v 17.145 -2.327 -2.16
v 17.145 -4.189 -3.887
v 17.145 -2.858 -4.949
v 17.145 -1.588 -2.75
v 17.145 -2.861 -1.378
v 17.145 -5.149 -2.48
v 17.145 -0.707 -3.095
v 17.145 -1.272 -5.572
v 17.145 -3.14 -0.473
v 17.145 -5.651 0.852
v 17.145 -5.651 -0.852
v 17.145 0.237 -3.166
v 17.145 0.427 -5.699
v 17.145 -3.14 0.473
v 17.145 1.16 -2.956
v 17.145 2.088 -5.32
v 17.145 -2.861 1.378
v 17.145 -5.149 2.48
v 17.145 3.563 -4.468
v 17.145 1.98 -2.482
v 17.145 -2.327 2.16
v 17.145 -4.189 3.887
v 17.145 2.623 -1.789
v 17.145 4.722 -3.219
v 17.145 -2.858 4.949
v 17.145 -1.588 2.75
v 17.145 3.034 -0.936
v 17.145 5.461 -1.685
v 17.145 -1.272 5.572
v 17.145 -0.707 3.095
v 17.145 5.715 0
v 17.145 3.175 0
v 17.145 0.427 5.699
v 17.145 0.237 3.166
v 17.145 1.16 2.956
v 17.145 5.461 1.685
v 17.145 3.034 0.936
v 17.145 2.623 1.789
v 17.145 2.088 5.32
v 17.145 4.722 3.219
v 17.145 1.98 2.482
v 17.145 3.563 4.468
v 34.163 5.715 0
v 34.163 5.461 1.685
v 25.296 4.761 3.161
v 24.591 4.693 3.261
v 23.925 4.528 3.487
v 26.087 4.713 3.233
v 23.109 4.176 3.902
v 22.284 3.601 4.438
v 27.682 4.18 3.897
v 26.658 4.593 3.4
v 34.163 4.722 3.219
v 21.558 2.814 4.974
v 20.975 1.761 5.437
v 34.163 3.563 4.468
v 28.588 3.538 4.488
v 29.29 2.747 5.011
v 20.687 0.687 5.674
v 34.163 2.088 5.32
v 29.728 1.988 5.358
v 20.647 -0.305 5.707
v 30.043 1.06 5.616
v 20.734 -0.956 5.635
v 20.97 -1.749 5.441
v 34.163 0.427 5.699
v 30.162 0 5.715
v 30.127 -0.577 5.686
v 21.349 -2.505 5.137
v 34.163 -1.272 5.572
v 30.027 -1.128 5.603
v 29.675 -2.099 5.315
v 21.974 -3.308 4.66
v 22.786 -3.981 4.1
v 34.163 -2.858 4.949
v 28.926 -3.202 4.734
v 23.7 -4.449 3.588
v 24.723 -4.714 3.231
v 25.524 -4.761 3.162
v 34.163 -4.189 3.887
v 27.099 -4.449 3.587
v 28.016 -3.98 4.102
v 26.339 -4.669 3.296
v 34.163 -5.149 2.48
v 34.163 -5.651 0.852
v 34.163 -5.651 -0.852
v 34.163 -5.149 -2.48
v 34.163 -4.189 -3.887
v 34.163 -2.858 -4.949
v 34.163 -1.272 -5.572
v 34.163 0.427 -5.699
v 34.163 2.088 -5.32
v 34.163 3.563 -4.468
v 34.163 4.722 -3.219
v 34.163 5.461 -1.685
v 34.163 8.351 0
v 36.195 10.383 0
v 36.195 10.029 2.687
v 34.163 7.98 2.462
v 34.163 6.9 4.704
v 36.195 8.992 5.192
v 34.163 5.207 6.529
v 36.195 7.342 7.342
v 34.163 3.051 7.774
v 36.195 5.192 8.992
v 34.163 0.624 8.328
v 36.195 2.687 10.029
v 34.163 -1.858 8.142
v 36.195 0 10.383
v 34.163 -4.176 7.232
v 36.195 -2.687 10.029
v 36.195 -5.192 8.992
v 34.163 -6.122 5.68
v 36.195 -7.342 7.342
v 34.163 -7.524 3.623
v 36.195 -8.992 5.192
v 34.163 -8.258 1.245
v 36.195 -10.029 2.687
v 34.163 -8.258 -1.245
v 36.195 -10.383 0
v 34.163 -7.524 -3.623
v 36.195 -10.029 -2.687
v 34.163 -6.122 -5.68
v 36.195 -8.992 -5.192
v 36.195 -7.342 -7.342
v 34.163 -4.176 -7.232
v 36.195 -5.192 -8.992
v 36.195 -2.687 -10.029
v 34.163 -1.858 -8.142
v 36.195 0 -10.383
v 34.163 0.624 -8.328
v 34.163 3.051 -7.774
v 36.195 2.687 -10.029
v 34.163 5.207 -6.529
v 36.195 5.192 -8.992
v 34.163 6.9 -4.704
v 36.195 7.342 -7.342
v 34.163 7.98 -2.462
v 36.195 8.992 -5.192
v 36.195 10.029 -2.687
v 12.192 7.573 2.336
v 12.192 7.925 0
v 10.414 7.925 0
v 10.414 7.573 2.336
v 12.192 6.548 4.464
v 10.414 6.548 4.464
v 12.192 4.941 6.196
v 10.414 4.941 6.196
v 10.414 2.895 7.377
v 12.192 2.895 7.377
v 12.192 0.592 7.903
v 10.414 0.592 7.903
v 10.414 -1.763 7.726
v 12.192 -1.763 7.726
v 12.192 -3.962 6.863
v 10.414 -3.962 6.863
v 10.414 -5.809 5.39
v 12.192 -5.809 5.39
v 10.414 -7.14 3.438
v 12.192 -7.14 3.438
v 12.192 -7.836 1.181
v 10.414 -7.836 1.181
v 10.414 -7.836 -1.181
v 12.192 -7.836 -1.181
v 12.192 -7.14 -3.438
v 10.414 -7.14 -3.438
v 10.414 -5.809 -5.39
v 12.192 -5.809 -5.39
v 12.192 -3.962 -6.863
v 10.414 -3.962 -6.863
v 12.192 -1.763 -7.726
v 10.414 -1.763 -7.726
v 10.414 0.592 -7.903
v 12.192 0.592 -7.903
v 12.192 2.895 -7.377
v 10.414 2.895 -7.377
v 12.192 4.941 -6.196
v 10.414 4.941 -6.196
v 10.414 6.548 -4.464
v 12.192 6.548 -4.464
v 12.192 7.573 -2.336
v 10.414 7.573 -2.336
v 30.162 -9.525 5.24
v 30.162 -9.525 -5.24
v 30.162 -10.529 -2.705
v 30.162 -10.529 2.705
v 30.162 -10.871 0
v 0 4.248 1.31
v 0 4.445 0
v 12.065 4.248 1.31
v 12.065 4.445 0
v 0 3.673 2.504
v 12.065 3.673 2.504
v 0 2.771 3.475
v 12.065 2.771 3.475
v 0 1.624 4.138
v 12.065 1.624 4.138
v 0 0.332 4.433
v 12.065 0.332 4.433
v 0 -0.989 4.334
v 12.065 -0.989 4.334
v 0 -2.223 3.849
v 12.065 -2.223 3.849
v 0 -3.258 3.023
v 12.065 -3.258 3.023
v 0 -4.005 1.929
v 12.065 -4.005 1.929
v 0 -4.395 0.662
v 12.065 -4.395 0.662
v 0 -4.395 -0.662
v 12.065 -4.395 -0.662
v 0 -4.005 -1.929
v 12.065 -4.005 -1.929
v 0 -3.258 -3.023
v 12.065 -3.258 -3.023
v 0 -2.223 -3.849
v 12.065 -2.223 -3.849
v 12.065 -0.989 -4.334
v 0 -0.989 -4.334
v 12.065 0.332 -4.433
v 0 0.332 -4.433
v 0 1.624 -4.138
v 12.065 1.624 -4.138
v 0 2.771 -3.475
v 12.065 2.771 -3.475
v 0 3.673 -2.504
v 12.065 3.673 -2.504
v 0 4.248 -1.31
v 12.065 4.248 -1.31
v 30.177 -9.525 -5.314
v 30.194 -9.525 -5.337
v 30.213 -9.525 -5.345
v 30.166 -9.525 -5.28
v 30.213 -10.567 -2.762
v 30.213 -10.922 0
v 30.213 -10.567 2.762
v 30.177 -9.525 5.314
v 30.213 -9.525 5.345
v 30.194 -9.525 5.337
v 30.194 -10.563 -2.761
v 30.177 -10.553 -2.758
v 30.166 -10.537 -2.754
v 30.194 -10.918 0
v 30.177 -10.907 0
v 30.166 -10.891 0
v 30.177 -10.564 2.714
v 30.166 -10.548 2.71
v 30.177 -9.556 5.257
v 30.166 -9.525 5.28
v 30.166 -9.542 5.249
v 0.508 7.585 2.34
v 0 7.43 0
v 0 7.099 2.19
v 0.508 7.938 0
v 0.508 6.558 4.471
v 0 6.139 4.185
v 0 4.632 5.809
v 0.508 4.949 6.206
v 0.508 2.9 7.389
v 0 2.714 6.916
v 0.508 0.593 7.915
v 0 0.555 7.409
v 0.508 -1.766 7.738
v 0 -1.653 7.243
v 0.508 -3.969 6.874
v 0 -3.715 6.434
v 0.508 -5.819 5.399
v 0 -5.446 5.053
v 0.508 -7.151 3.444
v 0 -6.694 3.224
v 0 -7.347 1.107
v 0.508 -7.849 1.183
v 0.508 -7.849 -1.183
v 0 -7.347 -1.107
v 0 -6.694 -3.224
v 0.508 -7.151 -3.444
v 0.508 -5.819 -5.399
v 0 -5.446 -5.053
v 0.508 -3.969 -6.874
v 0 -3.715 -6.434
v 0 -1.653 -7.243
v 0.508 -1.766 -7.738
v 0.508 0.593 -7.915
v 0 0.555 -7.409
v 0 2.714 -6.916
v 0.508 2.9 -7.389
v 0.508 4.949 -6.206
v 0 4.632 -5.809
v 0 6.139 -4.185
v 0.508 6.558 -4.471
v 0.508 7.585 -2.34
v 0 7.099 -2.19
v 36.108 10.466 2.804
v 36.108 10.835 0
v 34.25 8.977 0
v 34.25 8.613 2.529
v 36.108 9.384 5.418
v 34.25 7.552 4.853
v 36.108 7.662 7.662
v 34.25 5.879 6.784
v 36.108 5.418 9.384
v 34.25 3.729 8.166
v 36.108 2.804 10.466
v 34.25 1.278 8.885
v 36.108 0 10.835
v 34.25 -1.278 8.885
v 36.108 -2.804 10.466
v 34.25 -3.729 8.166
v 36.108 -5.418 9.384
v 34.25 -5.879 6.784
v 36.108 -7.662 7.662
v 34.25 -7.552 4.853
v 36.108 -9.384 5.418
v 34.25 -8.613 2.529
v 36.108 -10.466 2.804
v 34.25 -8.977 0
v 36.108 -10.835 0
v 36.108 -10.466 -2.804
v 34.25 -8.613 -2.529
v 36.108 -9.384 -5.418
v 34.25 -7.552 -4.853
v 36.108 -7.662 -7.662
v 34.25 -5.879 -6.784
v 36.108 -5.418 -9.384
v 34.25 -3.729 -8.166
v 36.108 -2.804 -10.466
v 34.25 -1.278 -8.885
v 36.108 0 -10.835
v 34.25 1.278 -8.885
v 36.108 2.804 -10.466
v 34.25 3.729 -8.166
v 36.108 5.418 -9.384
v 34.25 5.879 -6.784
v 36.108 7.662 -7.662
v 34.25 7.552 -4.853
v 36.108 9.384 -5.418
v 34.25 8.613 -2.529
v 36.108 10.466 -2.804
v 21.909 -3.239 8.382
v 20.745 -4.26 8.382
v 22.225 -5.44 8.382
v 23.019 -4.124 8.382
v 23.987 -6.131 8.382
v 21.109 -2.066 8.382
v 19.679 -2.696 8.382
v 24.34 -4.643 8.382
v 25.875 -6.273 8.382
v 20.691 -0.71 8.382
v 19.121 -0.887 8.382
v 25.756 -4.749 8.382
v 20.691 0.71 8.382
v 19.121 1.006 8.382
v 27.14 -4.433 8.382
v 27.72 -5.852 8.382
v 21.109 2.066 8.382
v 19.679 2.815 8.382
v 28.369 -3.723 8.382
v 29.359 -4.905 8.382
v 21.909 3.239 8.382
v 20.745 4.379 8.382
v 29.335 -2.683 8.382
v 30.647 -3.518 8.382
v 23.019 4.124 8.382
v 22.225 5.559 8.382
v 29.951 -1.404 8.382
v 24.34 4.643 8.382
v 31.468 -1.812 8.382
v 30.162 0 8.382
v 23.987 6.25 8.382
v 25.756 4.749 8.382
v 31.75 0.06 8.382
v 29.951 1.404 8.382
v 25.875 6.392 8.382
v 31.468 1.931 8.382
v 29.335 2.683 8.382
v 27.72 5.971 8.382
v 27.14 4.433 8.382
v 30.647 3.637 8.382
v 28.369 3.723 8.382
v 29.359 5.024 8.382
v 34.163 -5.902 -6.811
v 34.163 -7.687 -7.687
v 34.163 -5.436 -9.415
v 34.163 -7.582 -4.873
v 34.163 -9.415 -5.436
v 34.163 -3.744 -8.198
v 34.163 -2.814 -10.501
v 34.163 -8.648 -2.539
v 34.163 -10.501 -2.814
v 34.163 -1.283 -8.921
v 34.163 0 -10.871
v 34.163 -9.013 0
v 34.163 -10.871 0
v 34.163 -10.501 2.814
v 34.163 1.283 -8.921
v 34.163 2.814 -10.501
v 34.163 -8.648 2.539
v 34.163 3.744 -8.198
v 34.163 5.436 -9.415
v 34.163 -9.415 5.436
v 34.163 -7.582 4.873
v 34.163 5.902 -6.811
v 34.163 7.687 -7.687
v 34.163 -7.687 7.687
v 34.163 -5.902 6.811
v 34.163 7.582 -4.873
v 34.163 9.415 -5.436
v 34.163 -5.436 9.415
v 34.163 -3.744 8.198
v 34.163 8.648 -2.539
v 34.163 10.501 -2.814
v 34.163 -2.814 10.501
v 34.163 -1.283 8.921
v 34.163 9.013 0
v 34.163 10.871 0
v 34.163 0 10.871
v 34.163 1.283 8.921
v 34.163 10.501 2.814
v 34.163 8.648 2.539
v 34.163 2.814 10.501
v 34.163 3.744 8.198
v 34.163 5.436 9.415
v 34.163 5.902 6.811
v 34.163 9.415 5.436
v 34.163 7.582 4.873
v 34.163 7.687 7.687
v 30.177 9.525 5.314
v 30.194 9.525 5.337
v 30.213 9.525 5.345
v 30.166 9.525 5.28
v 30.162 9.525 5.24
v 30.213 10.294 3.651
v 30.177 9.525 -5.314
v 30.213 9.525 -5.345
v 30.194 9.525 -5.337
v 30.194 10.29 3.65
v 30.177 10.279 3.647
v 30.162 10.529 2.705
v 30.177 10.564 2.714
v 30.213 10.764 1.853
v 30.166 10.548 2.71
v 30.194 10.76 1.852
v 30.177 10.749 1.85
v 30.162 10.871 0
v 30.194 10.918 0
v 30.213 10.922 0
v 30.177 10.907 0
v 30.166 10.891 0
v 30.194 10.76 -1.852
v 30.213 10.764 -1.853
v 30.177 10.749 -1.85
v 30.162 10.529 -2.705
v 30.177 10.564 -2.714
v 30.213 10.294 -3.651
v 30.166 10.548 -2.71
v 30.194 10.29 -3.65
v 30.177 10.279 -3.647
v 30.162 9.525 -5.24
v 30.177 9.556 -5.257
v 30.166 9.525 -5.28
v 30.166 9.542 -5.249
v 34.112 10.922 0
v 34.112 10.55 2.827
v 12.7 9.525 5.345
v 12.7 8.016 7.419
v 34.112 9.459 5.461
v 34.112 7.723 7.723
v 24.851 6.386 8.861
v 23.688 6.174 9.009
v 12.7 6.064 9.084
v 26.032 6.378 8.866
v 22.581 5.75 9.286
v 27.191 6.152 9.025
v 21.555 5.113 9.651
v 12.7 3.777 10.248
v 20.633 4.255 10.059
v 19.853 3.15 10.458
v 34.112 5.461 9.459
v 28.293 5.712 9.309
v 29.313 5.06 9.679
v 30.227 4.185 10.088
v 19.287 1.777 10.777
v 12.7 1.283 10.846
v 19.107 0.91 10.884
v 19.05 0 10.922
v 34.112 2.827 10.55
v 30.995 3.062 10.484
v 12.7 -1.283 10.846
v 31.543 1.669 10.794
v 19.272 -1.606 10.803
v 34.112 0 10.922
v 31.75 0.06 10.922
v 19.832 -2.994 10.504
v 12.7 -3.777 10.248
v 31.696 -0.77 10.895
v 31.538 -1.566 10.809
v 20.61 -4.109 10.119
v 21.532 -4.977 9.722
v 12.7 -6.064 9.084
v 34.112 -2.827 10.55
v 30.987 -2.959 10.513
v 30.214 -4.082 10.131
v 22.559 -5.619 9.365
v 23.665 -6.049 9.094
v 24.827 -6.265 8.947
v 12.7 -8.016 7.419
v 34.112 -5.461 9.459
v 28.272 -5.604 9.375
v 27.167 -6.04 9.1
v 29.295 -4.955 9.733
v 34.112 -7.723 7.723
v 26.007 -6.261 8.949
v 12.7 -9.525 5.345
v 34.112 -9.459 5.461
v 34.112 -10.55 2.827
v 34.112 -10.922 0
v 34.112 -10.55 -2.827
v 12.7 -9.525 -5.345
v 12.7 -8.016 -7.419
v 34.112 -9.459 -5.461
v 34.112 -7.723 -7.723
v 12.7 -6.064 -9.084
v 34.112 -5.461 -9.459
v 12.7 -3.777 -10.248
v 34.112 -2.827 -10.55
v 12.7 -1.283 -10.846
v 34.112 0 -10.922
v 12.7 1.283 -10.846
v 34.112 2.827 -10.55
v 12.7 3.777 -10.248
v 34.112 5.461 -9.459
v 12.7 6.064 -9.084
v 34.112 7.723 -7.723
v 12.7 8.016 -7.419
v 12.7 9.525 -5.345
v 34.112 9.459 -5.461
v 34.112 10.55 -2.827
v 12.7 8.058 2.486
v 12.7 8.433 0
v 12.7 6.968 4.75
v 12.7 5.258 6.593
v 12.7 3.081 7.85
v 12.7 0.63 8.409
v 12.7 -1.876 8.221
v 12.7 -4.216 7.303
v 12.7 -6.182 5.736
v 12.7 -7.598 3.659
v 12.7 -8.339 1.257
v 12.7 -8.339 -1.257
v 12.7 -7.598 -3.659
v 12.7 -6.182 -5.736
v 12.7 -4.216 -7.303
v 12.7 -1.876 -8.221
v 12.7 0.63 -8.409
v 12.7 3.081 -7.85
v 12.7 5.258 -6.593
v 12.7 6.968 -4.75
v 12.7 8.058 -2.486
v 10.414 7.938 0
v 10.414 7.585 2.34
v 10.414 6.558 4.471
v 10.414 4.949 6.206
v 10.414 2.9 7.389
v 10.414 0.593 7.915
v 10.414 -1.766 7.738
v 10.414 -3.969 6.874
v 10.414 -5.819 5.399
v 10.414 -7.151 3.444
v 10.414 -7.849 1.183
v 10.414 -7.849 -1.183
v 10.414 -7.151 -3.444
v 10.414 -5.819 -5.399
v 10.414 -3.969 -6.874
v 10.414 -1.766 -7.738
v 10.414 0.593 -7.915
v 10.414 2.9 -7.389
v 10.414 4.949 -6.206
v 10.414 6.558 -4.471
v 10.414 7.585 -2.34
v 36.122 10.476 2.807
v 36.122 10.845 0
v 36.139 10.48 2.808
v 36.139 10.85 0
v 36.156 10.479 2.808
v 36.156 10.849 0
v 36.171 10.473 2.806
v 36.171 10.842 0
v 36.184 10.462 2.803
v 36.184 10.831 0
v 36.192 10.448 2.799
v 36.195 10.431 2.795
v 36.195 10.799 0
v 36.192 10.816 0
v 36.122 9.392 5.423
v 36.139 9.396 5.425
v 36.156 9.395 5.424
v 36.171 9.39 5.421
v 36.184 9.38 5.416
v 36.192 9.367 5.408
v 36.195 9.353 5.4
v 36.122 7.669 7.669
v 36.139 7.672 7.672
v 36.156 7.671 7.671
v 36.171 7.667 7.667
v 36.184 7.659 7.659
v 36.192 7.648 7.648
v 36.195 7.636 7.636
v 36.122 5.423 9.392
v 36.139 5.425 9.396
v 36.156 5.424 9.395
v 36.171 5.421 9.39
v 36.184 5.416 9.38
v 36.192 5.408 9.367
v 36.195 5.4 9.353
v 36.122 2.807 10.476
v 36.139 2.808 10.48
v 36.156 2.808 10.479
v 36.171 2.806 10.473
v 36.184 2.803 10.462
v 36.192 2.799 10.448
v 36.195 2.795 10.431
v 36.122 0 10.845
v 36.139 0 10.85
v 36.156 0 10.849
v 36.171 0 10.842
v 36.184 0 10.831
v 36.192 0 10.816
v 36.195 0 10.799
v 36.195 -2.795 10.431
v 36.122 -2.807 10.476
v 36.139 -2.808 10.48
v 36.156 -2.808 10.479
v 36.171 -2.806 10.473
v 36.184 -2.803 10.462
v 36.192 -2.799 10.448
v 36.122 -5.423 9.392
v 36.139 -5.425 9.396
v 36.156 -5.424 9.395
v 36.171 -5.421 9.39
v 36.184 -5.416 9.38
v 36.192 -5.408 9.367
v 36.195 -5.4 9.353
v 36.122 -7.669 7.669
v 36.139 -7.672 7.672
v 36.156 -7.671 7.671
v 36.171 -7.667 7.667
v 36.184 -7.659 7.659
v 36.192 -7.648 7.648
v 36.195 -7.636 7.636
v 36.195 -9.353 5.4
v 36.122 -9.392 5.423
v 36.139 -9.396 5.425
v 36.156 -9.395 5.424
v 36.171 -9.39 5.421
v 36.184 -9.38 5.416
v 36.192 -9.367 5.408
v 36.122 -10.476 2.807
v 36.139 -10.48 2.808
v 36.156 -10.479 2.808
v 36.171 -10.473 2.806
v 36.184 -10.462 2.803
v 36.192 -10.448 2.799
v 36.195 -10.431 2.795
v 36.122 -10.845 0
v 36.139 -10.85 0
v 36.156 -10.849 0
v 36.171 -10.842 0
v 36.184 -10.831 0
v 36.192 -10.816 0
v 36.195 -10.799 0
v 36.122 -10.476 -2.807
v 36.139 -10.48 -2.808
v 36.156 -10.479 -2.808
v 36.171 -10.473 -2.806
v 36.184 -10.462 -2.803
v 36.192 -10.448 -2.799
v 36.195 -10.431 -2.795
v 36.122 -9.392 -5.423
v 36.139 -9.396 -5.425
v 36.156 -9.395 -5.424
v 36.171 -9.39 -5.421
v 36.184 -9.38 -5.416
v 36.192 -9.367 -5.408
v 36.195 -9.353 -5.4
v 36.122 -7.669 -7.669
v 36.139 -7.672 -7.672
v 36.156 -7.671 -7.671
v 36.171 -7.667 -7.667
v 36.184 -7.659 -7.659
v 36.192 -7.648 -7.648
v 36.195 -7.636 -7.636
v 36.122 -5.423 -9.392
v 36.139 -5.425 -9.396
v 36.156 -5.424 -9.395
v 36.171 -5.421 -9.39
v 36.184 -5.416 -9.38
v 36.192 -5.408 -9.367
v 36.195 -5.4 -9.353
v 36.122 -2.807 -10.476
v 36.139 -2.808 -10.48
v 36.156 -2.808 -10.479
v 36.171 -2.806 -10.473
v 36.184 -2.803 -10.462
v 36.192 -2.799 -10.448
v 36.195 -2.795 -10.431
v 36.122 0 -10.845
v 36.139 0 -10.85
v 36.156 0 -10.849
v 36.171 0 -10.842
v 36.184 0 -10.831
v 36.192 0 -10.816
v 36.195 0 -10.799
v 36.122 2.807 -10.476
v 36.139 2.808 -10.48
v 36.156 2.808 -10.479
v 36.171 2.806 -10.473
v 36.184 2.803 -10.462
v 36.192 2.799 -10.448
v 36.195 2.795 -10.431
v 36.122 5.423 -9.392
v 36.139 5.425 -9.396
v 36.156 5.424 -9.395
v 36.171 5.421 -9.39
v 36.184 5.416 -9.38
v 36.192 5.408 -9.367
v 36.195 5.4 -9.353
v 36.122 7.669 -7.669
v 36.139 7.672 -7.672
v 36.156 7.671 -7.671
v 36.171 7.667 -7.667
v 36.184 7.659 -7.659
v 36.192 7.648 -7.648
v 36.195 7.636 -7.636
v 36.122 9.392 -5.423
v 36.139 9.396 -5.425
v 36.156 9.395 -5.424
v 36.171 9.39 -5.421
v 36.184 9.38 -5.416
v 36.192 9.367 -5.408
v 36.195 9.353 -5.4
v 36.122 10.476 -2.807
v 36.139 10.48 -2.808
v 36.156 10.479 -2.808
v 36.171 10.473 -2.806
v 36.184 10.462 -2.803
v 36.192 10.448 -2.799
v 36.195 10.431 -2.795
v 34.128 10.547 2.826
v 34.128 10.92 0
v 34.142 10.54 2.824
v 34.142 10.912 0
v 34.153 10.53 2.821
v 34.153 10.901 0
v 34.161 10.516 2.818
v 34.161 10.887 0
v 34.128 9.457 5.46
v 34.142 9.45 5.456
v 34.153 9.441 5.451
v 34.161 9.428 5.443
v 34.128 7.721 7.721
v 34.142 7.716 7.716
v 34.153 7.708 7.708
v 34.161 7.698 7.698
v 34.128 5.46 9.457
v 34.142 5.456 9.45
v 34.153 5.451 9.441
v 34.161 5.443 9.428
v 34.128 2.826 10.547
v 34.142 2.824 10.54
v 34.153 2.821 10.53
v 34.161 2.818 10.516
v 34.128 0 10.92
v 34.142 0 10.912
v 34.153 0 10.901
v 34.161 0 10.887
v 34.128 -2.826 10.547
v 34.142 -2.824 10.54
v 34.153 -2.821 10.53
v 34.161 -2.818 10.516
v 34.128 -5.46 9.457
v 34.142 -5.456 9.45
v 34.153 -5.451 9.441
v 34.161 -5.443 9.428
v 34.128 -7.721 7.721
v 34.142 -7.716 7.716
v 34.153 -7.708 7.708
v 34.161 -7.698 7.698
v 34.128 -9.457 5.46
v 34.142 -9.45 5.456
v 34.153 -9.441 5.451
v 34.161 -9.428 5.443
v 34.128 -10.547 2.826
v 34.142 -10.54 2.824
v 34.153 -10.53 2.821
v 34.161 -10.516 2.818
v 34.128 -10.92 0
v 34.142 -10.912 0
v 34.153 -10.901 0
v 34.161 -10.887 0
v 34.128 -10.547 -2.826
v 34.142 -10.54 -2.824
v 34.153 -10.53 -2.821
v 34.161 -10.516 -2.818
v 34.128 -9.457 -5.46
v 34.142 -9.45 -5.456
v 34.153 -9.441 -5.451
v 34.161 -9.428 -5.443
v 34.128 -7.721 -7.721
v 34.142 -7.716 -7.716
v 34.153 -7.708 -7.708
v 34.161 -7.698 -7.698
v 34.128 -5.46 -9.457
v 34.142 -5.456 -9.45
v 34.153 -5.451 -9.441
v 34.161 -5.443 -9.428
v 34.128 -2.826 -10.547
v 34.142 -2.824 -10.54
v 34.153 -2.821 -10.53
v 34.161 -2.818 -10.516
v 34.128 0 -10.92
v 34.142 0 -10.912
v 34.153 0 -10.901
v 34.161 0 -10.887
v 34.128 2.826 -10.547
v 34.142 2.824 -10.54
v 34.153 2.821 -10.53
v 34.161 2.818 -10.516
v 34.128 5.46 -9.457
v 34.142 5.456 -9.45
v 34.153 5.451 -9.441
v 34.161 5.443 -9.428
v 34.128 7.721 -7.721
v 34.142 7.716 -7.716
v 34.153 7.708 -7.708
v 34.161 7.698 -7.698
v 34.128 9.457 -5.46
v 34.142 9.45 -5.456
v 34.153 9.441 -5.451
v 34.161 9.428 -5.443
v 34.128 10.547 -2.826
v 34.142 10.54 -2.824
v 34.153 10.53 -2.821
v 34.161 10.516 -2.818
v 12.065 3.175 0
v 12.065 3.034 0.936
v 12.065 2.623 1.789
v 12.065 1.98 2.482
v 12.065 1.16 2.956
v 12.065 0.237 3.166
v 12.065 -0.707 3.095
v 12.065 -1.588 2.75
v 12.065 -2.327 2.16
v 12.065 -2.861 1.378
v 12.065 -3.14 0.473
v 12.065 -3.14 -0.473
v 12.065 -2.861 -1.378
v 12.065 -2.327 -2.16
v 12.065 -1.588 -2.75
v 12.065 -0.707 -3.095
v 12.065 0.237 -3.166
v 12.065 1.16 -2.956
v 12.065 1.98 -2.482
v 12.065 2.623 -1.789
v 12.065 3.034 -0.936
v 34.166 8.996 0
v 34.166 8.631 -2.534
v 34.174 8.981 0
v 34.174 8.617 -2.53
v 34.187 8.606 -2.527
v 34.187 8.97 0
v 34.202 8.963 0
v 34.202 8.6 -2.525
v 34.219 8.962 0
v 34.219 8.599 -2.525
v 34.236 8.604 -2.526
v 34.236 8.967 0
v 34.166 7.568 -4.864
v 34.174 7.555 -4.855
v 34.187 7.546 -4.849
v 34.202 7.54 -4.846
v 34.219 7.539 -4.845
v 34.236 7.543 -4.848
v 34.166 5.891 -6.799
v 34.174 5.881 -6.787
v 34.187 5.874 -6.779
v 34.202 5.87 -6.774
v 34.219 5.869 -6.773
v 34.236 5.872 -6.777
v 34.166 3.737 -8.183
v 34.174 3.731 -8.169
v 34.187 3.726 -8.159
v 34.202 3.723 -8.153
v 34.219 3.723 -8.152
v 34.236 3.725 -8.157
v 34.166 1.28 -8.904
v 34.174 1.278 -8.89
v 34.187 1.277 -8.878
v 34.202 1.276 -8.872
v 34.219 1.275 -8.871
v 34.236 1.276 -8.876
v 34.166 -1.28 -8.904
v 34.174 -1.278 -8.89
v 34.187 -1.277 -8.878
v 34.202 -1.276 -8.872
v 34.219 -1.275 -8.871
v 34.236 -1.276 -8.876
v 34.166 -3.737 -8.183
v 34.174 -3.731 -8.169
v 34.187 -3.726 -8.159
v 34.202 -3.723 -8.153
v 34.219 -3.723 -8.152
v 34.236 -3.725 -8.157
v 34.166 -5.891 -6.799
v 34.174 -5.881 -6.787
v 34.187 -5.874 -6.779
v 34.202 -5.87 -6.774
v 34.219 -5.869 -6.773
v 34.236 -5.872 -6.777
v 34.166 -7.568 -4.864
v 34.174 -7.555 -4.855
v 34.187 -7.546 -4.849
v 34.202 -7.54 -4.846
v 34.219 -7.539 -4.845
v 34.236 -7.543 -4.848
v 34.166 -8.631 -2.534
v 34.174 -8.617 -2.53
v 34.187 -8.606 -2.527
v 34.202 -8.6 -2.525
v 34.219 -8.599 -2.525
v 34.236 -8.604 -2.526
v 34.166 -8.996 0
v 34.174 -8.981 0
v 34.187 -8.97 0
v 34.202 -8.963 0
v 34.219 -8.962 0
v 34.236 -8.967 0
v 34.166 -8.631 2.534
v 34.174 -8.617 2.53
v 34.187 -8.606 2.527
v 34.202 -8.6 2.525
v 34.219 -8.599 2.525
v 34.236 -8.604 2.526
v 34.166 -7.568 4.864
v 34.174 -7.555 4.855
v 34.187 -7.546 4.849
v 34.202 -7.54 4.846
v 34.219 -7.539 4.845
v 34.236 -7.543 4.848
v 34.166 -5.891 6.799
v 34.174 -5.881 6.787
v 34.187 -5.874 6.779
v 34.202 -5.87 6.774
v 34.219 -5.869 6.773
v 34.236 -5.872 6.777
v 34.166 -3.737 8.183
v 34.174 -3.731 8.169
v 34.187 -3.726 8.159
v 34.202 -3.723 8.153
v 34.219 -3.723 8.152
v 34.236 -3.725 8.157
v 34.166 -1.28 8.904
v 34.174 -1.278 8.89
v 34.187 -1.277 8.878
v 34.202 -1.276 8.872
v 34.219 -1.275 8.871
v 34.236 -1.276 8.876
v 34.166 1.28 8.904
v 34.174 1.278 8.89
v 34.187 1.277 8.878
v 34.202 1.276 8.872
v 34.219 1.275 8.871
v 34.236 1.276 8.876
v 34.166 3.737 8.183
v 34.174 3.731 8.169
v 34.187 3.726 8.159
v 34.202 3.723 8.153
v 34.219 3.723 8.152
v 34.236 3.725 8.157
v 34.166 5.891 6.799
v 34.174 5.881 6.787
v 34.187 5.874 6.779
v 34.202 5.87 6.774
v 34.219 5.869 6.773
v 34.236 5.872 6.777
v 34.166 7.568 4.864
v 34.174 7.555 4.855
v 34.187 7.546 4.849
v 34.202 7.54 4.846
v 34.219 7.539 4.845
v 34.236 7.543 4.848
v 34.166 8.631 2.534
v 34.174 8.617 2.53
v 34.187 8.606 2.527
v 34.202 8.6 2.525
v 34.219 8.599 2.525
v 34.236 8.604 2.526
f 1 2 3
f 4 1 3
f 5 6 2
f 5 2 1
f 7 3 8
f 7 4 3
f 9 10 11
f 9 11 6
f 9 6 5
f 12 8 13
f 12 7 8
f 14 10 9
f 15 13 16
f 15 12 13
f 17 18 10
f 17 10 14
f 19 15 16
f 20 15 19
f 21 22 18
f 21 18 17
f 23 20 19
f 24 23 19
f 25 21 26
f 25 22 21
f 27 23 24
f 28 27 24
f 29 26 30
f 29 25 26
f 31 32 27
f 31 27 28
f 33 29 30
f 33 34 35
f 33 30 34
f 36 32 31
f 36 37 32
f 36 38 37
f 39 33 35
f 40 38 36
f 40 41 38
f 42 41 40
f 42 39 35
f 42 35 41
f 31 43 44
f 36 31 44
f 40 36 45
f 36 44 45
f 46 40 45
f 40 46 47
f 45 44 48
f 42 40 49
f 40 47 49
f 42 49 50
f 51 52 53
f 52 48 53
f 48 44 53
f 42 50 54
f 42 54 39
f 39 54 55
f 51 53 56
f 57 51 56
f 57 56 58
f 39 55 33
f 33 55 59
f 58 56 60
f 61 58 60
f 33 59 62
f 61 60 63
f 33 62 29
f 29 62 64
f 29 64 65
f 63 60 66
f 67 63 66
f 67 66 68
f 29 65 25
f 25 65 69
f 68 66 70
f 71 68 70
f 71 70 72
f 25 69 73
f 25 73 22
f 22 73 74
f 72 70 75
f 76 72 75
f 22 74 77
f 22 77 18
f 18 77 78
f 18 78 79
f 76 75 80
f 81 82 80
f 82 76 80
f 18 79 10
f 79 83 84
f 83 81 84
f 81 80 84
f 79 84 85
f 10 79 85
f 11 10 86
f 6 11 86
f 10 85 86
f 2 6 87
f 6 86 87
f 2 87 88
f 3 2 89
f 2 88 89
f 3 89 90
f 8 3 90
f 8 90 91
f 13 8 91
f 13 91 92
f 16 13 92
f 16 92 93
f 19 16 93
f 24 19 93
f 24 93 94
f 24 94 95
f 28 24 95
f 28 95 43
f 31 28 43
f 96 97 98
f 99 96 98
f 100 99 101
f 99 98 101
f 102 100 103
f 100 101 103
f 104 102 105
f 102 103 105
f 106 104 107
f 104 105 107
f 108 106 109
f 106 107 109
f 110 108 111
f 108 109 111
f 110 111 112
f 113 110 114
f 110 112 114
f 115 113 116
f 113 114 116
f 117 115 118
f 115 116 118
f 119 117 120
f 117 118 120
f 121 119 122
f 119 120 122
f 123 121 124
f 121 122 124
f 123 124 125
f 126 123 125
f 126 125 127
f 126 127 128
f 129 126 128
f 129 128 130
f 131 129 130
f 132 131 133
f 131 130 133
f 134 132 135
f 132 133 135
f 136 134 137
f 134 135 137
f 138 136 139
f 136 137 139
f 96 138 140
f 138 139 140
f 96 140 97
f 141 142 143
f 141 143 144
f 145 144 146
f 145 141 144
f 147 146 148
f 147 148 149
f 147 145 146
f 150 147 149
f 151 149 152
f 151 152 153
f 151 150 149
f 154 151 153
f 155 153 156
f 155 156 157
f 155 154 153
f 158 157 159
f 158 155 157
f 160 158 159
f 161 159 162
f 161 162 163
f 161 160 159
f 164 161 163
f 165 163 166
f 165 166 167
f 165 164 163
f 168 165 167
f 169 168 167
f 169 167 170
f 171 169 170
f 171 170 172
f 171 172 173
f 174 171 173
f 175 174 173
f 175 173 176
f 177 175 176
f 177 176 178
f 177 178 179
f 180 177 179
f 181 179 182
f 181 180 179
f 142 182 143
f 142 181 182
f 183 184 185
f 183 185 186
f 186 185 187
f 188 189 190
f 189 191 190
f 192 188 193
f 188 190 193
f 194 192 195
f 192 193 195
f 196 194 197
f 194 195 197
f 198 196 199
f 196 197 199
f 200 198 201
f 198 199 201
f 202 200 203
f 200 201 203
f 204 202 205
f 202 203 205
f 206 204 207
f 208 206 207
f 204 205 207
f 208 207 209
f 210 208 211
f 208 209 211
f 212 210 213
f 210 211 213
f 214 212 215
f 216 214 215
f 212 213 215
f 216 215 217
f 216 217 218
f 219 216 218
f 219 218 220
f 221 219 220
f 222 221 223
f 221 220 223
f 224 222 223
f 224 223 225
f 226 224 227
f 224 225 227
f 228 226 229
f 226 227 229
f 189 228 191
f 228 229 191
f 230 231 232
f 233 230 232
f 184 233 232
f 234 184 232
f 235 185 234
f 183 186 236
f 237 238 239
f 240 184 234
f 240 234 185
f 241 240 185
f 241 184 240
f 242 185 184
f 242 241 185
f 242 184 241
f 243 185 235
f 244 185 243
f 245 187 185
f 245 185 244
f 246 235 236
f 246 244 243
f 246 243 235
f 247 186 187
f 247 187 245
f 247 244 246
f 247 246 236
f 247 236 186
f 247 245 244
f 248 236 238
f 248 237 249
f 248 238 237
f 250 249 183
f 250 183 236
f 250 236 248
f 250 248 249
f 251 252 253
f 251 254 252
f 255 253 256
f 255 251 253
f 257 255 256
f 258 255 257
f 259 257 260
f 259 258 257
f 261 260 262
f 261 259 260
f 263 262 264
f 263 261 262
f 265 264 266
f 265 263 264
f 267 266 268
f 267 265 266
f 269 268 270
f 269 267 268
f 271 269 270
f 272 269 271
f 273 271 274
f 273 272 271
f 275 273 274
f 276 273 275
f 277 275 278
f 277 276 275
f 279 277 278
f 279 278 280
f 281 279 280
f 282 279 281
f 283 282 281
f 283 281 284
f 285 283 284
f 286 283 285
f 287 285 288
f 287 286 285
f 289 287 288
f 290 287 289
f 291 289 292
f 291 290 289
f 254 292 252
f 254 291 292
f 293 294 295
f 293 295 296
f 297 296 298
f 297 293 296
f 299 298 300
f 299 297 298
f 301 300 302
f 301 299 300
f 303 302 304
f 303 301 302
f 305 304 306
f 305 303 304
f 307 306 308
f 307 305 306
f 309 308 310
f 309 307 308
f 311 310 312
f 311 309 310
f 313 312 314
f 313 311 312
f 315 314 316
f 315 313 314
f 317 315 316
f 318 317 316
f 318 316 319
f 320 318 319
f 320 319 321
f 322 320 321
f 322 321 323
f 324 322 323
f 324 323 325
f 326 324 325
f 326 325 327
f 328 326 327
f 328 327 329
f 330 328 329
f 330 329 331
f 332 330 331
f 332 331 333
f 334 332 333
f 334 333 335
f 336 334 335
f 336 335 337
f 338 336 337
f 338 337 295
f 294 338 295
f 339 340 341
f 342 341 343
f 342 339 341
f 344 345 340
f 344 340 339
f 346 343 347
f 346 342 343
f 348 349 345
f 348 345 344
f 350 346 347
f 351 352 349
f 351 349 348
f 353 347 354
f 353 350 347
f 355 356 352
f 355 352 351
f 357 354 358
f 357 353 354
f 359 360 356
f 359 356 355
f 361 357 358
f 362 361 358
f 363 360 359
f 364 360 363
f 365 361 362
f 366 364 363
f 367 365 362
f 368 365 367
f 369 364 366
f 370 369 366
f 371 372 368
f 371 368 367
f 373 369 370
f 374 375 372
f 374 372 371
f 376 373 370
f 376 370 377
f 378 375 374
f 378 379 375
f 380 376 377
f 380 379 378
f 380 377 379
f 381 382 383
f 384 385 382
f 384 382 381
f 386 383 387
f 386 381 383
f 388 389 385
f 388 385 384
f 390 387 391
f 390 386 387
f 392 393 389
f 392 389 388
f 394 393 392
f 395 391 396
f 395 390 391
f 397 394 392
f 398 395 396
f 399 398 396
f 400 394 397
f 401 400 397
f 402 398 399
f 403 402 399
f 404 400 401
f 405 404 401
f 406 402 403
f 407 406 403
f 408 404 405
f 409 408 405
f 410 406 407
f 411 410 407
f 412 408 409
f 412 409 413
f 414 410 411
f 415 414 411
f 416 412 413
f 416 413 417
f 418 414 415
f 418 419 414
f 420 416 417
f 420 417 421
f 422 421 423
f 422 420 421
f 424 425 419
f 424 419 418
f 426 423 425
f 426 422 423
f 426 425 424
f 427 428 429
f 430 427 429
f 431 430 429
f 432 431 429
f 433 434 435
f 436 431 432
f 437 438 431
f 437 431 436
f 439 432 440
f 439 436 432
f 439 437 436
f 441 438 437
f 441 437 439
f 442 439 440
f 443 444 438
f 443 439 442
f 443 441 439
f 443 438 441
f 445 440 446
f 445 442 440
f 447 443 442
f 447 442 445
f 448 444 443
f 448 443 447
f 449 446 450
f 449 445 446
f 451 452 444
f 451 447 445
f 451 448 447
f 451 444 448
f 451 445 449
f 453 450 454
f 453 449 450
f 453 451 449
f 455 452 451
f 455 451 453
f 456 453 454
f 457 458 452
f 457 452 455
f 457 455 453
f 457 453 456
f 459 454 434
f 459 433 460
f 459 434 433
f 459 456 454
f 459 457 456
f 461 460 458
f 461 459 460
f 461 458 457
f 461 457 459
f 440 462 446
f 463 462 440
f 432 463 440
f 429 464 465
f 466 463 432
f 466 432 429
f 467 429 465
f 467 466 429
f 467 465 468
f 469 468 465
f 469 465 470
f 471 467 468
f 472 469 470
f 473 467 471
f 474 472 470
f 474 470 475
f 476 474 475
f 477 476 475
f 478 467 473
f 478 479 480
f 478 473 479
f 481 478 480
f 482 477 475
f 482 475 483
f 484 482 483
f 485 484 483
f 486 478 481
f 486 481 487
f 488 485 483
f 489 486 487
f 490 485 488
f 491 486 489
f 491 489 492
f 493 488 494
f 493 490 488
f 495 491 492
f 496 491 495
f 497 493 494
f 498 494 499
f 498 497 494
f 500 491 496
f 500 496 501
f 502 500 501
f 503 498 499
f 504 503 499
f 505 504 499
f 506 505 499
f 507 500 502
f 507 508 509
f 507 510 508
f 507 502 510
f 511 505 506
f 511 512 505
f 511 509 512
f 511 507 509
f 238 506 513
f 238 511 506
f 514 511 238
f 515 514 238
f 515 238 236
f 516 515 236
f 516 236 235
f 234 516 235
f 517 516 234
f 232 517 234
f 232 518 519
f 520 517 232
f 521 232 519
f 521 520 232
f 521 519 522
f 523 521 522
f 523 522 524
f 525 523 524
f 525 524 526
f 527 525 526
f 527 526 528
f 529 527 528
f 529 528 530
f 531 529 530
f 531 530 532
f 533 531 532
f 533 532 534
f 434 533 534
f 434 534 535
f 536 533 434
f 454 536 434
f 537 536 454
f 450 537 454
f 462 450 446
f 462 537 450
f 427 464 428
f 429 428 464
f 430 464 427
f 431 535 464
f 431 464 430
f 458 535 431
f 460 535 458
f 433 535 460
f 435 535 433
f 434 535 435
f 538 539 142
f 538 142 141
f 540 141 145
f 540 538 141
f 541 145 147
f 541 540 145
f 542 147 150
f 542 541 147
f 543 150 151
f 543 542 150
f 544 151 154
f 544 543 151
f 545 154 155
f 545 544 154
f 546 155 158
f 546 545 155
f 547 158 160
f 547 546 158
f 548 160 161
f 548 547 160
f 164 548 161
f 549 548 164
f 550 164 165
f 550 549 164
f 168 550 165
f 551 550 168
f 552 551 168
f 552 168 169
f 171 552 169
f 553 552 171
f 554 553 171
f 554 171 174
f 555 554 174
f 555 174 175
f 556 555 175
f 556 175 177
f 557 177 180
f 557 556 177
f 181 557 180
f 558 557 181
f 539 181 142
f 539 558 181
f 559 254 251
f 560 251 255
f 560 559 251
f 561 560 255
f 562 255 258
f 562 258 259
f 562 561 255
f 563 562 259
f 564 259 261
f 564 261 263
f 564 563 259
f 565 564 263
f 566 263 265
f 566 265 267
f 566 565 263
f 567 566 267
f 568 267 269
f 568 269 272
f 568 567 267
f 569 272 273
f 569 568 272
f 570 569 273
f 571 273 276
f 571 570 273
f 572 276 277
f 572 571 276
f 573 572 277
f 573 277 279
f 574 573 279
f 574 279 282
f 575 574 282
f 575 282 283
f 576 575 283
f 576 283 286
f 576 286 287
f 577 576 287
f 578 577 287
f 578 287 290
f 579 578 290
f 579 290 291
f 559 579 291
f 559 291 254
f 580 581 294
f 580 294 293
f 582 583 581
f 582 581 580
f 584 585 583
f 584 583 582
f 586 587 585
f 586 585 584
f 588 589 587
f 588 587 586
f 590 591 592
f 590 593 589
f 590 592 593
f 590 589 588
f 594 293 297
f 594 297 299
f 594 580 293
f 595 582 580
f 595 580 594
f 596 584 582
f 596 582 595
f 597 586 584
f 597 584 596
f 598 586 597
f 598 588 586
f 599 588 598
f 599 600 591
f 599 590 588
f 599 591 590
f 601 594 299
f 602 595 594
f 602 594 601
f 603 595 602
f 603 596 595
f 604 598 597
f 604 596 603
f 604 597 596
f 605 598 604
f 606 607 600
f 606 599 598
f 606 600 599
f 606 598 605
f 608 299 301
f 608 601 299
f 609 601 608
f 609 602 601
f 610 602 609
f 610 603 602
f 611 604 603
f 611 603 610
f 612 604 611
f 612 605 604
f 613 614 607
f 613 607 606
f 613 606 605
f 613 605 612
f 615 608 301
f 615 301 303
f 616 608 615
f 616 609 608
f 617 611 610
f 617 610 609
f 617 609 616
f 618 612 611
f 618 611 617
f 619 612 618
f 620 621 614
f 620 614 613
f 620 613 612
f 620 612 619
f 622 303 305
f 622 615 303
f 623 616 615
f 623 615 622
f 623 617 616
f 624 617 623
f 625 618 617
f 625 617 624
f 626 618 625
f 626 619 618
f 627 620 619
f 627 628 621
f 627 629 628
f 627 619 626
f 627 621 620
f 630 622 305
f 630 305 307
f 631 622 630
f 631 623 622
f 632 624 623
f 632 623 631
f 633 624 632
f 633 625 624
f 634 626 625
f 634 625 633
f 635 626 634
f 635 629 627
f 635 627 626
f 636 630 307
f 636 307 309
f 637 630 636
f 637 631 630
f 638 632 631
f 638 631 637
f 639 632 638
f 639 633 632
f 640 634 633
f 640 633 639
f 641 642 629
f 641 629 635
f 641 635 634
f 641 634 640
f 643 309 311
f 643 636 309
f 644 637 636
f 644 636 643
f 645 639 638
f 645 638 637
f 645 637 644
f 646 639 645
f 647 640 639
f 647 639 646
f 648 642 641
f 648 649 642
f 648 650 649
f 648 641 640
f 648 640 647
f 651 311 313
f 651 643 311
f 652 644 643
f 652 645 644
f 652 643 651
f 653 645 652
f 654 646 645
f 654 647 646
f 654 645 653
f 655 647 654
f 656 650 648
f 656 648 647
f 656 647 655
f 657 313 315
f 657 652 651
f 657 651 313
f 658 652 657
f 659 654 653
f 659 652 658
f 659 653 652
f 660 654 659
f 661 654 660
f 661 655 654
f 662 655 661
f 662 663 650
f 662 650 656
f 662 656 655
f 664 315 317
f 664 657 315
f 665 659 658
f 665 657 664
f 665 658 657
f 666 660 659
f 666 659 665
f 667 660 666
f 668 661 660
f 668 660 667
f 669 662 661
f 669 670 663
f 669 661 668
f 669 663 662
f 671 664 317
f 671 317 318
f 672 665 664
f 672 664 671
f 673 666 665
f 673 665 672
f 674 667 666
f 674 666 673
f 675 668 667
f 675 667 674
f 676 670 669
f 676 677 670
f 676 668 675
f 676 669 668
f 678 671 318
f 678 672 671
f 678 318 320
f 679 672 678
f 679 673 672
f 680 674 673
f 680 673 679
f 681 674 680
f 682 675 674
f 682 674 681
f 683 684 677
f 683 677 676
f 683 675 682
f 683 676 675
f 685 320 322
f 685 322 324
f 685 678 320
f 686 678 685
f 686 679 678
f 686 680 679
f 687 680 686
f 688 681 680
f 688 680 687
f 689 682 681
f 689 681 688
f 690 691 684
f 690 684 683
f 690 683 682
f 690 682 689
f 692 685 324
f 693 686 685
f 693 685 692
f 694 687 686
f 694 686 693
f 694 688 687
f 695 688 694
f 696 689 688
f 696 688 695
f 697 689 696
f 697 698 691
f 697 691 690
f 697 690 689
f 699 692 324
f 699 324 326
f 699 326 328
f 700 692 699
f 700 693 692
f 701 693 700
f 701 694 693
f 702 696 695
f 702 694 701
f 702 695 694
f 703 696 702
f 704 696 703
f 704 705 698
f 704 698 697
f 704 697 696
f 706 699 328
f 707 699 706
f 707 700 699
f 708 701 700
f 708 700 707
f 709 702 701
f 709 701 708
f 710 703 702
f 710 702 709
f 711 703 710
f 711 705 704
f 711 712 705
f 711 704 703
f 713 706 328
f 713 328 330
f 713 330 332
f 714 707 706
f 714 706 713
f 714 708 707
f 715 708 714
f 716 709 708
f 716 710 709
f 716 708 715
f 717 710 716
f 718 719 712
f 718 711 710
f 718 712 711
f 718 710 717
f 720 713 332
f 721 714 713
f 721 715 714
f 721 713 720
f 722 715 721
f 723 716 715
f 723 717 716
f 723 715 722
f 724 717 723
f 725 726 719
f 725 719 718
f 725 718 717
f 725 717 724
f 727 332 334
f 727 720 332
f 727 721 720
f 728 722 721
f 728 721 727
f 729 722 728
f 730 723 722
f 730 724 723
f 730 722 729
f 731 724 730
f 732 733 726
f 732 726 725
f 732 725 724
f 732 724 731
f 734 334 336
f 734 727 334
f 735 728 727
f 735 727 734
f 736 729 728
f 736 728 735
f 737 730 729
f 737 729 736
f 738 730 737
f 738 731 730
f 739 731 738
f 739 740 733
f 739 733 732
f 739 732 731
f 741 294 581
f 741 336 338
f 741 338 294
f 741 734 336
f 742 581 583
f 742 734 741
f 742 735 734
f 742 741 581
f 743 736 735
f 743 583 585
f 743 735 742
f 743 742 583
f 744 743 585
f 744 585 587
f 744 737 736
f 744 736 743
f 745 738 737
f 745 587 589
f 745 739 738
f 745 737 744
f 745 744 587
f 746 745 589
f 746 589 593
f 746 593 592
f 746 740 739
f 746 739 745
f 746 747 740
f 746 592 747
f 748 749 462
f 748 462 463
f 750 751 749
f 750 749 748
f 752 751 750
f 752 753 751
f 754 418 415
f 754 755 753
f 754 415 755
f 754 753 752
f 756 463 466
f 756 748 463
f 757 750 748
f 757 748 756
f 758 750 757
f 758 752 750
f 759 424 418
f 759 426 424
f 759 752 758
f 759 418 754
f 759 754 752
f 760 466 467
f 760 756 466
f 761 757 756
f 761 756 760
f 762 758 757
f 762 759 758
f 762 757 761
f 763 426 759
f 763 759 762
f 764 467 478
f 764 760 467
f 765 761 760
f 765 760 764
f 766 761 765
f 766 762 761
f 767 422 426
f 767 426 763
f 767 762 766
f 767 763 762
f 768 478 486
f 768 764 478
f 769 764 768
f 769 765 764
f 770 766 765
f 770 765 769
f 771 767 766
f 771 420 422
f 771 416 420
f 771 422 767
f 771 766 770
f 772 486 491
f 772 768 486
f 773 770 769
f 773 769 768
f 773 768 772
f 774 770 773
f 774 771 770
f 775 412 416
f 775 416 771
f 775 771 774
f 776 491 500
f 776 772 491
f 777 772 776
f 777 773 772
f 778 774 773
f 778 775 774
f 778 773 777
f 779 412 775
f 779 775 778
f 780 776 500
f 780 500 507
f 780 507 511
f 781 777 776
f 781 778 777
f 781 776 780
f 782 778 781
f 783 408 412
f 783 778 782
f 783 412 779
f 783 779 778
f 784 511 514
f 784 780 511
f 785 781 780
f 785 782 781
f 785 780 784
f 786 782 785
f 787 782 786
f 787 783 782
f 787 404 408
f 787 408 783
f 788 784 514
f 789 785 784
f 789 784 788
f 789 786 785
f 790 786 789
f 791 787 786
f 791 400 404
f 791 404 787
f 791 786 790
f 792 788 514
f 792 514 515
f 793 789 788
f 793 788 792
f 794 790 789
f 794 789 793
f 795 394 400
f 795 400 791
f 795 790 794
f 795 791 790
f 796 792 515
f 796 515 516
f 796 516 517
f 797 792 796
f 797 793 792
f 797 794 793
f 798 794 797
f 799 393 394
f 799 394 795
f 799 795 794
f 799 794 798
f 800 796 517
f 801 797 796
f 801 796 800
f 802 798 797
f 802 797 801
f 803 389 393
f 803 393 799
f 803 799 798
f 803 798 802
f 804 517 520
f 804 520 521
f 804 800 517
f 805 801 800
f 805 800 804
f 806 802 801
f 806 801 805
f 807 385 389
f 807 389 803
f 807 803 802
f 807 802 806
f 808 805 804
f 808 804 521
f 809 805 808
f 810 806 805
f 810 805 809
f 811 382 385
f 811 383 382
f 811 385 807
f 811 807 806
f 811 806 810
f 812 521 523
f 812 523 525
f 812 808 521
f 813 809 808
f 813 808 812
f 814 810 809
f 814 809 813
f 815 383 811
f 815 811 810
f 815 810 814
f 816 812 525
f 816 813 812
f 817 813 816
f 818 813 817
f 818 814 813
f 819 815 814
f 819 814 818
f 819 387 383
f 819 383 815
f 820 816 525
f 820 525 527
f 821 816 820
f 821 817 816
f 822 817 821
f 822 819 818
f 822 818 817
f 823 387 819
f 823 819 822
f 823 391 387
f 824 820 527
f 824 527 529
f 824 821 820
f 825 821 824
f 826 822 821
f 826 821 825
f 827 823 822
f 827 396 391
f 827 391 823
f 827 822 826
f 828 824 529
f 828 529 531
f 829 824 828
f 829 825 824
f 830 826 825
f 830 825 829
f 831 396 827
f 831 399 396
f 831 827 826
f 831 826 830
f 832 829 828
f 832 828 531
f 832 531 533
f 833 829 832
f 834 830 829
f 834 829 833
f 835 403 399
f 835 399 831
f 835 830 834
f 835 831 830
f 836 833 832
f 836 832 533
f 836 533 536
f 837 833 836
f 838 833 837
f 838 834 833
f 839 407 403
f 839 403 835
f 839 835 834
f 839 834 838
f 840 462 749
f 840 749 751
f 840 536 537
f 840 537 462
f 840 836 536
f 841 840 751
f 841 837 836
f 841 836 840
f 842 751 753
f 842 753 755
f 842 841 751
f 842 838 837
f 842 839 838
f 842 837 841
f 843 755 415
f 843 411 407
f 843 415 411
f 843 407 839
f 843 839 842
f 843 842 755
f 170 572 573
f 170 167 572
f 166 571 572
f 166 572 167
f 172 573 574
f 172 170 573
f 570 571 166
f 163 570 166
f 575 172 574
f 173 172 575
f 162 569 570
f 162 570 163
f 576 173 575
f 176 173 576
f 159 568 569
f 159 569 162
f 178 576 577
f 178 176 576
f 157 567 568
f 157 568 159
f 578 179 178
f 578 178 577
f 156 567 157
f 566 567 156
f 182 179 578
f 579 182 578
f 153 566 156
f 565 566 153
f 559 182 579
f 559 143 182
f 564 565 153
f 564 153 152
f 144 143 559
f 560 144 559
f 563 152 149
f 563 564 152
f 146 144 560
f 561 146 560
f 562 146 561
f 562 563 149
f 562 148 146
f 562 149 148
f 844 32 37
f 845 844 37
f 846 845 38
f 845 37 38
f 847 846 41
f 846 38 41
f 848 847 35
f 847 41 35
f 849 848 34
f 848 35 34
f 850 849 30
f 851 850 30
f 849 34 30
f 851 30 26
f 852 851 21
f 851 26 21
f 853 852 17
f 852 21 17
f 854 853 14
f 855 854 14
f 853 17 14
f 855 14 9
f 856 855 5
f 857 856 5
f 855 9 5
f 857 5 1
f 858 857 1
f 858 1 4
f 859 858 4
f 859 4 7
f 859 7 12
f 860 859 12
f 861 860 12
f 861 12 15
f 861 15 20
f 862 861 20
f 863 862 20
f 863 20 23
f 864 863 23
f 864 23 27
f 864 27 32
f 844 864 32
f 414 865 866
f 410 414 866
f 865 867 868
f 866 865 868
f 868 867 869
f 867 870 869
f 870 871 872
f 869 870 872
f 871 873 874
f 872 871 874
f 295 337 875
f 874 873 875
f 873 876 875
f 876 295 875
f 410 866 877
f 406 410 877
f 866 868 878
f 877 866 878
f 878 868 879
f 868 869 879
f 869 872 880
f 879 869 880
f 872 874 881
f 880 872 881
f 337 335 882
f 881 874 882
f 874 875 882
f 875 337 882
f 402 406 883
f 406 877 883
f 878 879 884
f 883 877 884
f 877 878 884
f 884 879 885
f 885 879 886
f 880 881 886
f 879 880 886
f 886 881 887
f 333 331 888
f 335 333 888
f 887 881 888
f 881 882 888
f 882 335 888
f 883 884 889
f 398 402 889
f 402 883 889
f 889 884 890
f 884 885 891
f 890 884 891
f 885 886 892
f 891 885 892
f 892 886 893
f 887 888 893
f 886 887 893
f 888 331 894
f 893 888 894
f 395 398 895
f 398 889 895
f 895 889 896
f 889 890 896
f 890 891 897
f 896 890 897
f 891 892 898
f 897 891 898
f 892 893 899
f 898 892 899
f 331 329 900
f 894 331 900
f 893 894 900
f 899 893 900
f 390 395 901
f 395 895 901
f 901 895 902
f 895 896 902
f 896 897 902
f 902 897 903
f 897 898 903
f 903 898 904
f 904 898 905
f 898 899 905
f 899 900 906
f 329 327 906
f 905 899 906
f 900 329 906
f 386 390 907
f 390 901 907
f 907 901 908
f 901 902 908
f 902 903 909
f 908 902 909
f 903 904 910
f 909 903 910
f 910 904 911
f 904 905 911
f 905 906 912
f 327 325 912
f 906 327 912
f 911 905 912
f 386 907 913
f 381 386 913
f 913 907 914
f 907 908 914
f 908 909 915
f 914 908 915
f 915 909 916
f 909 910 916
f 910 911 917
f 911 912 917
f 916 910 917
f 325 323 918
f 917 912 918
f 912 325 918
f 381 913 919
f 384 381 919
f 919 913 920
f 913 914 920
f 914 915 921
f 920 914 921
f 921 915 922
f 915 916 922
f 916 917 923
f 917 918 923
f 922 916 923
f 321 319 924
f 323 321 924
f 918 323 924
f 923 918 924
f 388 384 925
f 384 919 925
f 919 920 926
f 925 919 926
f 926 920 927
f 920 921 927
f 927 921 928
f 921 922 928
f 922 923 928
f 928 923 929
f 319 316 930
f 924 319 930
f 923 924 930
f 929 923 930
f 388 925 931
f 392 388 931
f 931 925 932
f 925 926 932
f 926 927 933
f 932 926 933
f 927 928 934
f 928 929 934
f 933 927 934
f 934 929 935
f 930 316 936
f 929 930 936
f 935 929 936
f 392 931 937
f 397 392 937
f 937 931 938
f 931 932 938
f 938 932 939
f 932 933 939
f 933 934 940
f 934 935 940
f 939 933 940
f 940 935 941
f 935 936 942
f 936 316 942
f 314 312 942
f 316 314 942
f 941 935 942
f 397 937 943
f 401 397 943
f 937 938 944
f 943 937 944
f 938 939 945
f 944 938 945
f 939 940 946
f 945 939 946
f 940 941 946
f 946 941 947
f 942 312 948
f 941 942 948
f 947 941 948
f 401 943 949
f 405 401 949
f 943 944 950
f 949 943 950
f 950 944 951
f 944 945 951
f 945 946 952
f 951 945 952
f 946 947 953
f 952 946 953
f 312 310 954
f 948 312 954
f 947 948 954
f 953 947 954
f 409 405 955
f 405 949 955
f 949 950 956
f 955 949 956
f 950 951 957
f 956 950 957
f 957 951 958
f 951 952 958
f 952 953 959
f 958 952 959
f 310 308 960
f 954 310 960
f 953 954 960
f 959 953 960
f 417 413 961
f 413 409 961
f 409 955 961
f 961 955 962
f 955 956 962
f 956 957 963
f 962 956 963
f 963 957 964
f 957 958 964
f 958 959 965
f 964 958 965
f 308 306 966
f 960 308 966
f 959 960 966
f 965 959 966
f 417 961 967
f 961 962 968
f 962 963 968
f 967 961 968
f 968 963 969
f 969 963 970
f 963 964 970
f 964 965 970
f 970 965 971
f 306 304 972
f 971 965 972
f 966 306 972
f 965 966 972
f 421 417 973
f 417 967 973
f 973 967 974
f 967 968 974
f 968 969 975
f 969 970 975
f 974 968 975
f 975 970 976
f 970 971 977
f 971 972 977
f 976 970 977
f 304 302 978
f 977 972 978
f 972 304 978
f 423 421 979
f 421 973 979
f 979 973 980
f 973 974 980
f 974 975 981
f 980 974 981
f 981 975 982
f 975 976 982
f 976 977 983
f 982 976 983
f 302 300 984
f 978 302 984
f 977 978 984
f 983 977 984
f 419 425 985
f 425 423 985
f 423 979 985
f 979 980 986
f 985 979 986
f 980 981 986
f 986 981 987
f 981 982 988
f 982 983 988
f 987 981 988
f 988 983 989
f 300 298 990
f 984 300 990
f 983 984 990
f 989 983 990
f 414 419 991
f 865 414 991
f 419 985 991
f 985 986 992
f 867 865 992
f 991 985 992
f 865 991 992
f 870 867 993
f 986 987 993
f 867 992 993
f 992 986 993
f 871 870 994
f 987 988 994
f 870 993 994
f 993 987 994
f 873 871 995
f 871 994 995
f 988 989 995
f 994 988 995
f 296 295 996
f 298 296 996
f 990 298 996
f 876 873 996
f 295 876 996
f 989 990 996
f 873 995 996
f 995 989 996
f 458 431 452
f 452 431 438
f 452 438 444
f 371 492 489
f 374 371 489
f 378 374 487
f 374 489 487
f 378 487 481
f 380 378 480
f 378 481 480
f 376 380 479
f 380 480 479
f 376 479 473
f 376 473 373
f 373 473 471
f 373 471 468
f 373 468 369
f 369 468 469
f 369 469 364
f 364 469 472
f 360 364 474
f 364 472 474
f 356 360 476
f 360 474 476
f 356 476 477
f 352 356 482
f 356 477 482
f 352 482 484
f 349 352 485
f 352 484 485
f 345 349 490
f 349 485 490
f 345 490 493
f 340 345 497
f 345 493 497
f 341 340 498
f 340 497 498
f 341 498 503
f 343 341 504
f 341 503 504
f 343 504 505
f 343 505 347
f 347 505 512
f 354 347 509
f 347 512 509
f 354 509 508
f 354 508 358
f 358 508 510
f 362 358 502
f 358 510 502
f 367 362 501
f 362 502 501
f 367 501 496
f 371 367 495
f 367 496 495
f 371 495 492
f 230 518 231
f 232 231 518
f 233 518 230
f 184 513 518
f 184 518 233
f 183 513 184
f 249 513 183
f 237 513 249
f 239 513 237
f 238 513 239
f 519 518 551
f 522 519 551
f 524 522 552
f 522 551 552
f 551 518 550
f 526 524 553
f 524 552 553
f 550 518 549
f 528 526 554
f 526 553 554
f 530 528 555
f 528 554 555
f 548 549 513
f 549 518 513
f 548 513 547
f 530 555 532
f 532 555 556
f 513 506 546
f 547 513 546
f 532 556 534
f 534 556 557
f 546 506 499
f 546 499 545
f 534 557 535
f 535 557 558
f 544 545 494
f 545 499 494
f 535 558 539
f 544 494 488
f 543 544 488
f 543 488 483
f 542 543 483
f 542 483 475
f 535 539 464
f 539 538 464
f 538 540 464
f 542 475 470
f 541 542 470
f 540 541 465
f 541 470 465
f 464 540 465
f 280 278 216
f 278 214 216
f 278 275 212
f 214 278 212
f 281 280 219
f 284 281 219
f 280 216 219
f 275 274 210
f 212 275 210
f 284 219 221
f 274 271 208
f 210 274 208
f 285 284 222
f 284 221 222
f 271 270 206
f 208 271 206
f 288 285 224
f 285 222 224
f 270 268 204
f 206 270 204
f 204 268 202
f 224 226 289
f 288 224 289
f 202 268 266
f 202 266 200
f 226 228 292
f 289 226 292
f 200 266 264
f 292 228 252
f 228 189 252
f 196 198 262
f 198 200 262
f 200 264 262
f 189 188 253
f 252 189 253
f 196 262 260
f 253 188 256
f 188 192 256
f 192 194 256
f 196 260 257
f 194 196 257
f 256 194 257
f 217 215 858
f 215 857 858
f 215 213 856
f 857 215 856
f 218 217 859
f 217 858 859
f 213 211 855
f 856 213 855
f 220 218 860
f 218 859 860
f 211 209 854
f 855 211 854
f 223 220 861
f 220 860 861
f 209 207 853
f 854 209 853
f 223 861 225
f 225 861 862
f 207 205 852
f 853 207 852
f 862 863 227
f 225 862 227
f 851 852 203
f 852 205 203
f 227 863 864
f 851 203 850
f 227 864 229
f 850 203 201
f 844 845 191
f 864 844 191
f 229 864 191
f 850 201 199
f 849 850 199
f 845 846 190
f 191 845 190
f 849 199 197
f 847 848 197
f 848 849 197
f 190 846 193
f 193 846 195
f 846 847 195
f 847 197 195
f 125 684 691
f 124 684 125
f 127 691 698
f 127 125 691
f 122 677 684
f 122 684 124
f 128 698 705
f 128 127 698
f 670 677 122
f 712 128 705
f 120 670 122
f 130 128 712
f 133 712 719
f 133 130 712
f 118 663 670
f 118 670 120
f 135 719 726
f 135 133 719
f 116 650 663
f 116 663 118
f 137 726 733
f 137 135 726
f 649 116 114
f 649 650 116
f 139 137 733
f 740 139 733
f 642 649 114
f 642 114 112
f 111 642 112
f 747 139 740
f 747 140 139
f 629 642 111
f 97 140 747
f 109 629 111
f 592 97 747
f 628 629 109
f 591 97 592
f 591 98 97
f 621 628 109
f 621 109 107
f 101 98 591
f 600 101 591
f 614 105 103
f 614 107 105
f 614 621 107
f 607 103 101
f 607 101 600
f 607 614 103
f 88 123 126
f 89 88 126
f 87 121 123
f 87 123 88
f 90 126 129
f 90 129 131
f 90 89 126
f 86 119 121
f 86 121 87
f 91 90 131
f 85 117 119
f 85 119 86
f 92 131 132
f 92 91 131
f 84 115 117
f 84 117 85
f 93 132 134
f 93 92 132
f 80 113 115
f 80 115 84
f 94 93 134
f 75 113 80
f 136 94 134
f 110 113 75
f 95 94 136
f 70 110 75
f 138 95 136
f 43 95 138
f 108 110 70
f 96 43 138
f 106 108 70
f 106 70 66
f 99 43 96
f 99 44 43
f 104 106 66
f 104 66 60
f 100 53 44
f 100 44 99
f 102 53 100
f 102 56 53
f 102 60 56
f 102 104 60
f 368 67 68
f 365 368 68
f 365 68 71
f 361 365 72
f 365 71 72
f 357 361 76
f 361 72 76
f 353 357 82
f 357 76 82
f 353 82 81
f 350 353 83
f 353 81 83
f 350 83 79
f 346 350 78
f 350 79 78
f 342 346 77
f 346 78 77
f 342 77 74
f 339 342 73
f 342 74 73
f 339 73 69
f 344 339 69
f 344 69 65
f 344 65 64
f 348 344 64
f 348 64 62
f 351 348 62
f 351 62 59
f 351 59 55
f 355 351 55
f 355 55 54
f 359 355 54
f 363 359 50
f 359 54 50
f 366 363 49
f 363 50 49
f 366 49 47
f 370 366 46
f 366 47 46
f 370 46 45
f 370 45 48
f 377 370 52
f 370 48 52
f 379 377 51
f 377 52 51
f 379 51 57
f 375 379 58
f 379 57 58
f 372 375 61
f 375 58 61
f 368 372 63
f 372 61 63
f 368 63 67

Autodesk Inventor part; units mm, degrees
ref_plane "YZ Plane" through (0, 0, 0) normal (1, 0, 0) x (0, 1, 0)
ref_plane "XZ Plane" through (0, 0, 0) normal (0, 1, 0) x (-1, 0, 0)
sketch "Sketch1" plane through (0, 0, 0) normal (0, 0, 1) x (1, 0, 0)
  line L0 (0, 0) -> (36.195, 0)
  line L1 (0, 7.9375) -> (10.414, 7.9375)
  line L2 (10.414, 7.9375) -> (10.414, 7.9248)
  line L3 (10.414, 7.9248) -> (12.7, 7.9248)
  line L4 (12.7, 7.9248) -> (12.7, 9.525)
  line L5 (12.7, 9.525) -> (30.1625, 9.525)
  line L6 (30.1625, 9.525) -> (30.1625, 10.922)
  line L7 (30.1625, 10.922) -> (34.163, 10.922)
  line L8 (34.163, 10.922) -> (34.163, 8.89)
  line L9 (34.163, 8.89) -> (36.195, 10.922)
  line L10 (36.195, 10.922) -> (36.195, 5.715)
  line L11 (0, 7.9375) -> (0, 4.445)
  line L12 (0, 3.175) -> (12.065, 3.175)
  line L13 (36.195, 5.715) -> (36.195, 0) construction
  line L14 (0, 3.175) -> (0, 0) construction
  line L15 (34.163, 10.922) -> (36.195, 10.922) construction
  line L16 (30.1625, 8.89) -> (34.163, 8.89) construction
  line L17 (12.7, 9.525) -> (12.7, 10.922)
  line L18 (12.7, 10.922) -> (30.1625, 10.922)
  circle A0 centre (25.4, 0) radius 4.7625
  line L19 (17.145, 3.175) -> (17.145, 5.715)
  line L20 (17.145, 5.715) -> (34.163, 5.715)
  line L21 (36.195, 10.3832) -> (34.163, 8.3512)
  line L22 (34.163, 8.3512) -> (34.163, 5.715)
  line L23 (34.163, 8.89) -> (34.163, 8.3512) construction
  line L24 (34.163, 5.715) -> (36.195, 5.715) construction
  line L25 (0, 4.445) -> (12.065, 4.445)
  line L26 (12.065, 4.445) -> (12.065, 3.175)
  line L27 (12.065, 3.175) -> (17.145, 3.175)
  line L28 (0, 4.445) -> (0, 3.175)
  dimension "d0" = 17.4625
  dimension "d2" = 15.8496
  dimension "d3" = 15.875
  dimension "d4" = 2.286
  dimension "d5" = 12.7
  dimension "d6" = 6.35
  dimension "d7" = 19.05
  dimension "d8" = 21.844
  dimension "d9" = 17.78
  dimension "d10" = 45
  dimension "d11" = 36.195
  dimension "d23" = 9.525
  dimension "d24" = 25.4
  dimension "d34" = 11.43
  dimension "d35" = 19.05
  dimension "d36" = 0.381
  dimension "d45" = 12.065
  dimension "d46" = 8.89
revolve "Revolution1" add sketch "Sketch1" angle 360 about axis through (0, 0, 0) along (1, 0, 0) contours L1 L2 L3 L4 L5 L6 L7 L8 L9 L10 L21 L22 L20 L19 L27 L26 L25 L11 | L17 L18 L6 L5
extrude "Extrusion1" cut sketch "Sketch1" along normal through all both and the other way through all contours L17 L18 L6 L5
extrude "Extrusion2" cut sketch "Sketch1" along normal through all contours A0 L0 | L0 A0
thread "Thread1" size "5/8-18 UNF" class "2A" standard "ANSI Unified Screw Threads" full length
chamfer "Chamfer1" distance 0.508 angle 45 2 edges at (12.7, -7.9248, 0) (0, -7.9375, 0)
chamfer "Chamfer2" distance 0.762 angle 45 1 edges at (20.6375, 0.0005, 10.922)
pattern_circular "Circular Pattern1" count 2 over 360 about axis through (21.4313, 0, 0) along (1, 0, 0) of "Extrusion1"
thread "Thread3" size "1/8" designation "1/8 - 27 NPT" standard "NPT" length 9.9568
fillet "Fillet1" radius 0.0508 6 edges at (36.195, -10.922, 0) (34.163, -8.89, 0) (34.163, -10.922, 0) (30.1625, 10.567, 2.7621) (30.1625, 10.567, -2.7621) (30.1625, -10.922, 0)
ref_plane "Work Plane1" through (21.4313, 0, 10.922) normal (0, 0, 1) x (1, 0, 0)
sketch "Sketch2" plane through (21.4313, 0, 10.922) normal (0, 0, 1) x (1, 0, 0)
  circle A0 centre (3.9687, 0.0595) radius 6.35
  line L0 (3.9687, 0.0595) -> (3.9687, -4.7625) construction
  point P0 (-21.4313, 0)
  dimension "d41" = 12.7
  dimension "d44" = 4.822
extrude "Extrusion4" cut sketch "Sketch2" against normal blind 2.54
properties part number "Rebuild Shooter NCDME075-0600 Cylinder Front Section" material "Aluminum 6061"
